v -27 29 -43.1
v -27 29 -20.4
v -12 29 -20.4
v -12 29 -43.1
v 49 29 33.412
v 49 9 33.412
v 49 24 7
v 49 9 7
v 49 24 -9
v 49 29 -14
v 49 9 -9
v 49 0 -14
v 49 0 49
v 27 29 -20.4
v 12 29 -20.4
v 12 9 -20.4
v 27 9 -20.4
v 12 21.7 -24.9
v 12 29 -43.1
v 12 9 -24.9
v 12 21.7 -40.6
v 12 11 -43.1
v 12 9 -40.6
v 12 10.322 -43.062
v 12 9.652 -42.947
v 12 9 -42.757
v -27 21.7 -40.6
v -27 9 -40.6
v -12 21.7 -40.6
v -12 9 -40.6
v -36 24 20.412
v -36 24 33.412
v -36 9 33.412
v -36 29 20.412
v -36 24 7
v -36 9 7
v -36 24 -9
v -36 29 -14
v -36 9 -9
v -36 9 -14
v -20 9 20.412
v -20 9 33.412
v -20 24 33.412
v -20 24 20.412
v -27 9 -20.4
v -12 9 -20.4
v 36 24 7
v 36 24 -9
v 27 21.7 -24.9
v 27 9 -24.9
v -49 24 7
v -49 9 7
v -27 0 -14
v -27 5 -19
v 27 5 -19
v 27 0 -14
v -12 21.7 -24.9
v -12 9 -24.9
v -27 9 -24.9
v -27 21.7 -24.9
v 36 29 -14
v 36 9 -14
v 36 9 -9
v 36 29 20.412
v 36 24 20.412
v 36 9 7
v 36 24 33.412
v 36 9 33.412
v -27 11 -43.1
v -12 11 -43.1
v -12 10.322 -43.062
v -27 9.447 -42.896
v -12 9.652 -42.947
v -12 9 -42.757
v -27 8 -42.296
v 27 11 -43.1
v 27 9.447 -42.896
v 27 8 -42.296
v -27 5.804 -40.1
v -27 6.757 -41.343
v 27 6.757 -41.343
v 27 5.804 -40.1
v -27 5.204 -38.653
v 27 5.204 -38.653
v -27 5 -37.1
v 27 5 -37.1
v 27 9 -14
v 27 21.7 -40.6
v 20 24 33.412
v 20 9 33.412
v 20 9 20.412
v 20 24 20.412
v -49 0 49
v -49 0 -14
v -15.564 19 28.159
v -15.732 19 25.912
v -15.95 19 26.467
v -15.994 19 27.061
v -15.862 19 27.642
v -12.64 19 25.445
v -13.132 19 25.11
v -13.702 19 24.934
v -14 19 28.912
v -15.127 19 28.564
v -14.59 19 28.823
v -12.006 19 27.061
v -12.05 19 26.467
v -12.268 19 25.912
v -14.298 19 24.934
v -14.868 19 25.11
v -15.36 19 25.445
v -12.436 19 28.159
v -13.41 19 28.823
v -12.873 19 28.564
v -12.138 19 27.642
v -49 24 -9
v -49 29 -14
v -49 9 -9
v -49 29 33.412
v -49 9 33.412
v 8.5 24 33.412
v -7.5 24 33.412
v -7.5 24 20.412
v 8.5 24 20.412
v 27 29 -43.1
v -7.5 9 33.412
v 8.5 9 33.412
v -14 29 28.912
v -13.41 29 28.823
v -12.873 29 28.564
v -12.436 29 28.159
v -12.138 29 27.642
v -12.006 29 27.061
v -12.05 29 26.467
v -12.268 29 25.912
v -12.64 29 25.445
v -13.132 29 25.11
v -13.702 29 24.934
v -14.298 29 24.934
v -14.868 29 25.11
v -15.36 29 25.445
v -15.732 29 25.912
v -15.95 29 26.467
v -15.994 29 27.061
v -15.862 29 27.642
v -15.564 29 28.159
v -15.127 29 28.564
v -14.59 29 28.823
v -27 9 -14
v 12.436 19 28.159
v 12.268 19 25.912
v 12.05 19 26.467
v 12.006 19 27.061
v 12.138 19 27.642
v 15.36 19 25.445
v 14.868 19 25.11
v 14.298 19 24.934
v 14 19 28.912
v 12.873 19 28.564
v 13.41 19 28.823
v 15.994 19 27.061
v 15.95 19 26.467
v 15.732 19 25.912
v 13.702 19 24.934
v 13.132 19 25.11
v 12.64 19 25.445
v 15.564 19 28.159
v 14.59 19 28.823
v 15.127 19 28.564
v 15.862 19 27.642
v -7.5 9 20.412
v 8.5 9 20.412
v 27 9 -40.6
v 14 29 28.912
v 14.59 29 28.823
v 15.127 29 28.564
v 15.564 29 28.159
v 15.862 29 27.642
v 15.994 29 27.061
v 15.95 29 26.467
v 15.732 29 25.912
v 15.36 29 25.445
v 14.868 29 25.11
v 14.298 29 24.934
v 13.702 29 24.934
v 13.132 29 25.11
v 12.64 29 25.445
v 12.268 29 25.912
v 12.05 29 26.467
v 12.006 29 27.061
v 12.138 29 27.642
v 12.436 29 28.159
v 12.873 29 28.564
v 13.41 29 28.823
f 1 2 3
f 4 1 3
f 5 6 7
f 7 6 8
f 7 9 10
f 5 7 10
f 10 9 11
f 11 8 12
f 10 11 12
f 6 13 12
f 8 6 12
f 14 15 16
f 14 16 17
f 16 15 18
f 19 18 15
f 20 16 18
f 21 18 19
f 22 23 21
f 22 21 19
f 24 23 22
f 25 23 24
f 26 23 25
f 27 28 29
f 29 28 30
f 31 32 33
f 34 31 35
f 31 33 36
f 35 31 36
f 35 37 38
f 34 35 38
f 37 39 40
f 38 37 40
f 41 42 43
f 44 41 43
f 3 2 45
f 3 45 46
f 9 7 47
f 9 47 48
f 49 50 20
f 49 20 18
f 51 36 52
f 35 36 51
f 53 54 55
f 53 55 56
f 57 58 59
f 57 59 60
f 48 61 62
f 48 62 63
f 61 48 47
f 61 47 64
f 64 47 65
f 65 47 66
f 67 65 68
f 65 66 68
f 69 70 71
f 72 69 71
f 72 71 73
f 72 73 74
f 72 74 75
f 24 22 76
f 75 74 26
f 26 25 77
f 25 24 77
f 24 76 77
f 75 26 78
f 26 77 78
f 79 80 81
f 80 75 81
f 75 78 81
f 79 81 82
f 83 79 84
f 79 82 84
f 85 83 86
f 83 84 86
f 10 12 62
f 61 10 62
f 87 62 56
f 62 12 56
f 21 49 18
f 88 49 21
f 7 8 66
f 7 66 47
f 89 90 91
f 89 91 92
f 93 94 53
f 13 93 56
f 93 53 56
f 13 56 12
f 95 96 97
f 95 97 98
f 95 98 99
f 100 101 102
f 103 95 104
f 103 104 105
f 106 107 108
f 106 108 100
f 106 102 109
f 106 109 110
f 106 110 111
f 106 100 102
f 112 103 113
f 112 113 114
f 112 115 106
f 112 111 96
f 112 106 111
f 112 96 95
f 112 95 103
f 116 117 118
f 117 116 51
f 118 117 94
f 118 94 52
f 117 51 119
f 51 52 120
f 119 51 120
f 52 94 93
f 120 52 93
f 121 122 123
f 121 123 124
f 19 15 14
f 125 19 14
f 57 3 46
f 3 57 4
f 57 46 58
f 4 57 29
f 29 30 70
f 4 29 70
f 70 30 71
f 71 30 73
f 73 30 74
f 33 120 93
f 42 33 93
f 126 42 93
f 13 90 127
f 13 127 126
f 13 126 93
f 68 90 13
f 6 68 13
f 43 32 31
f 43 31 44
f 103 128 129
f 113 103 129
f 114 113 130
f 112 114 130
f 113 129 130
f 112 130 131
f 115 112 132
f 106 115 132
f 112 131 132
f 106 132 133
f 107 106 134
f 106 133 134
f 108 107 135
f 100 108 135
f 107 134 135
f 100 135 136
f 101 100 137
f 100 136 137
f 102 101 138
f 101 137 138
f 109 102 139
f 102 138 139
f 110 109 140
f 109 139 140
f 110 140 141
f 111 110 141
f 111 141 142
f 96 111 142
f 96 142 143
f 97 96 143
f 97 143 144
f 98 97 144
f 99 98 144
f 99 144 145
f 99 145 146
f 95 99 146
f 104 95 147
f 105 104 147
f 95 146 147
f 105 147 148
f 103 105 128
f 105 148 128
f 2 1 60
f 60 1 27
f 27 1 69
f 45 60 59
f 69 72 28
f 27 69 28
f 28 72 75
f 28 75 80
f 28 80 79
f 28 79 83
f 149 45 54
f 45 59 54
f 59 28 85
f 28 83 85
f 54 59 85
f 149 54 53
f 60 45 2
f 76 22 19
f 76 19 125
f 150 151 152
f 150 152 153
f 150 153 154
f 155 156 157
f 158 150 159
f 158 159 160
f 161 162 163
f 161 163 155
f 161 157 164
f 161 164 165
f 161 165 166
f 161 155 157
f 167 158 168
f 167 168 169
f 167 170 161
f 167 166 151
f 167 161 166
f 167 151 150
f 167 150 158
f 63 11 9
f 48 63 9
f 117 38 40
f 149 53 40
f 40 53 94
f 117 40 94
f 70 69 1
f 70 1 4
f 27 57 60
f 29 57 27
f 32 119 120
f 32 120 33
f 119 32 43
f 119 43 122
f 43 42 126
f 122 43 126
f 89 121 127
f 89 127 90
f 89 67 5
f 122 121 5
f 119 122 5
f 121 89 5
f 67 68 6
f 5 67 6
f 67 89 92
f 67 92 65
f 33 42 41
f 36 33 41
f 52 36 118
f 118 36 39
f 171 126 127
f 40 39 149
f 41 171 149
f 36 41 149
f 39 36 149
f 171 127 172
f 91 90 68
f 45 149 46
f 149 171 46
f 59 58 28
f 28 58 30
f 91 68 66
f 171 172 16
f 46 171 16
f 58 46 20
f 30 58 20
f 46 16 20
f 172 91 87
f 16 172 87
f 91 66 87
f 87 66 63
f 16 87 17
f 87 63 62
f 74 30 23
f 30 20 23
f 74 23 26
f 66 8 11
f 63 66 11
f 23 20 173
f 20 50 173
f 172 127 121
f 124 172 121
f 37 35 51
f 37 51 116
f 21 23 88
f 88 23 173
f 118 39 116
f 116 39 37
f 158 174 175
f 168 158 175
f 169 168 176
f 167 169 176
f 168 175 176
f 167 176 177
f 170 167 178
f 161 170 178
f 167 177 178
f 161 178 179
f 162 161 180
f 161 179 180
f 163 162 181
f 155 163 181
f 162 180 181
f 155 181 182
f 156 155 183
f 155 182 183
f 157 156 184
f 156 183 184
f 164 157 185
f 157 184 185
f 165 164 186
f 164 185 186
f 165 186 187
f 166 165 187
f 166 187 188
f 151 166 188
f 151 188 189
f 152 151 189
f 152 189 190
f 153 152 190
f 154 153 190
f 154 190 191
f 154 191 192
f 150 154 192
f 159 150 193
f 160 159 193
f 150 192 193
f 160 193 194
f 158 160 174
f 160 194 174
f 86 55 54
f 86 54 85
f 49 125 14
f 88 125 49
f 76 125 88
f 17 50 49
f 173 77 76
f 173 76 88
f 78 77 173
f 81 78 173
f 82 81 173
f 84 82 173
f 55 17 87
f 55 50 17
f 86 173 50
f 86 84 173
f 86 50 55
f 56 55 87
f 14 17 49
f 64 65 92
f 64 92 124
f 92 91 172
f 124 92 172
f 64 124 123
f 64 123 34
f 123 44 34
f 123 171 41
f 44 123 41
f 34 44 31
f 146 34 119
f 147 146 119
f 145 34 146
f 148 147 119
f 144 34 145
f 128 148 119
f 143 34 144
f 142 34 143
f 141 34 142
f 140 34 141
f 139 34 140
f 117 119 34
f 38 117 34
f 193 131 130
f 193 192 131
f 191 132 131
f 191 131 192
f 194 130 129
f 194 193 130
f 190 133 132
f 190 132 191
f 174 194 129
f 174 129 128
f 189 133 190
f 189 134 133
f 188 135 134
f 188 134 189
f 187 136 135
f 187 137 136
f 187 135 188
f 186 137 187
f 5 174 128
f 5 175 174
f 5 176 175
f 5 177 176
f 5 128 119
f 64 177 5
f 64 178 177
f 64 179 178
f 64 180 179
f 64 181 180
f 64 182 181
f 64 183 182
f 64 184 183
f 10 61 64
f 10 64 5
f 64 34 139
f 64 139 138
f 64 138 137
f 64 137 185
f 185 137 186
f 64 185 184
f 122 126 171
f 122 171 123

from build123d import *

# Parameters (mm, degrees)
CROQUIS1_W              = 98
CROQUIS1_H              = 98
SALIENTE_EXTRUIR1_DEPTH = 9
CHAFL_N1_SIZE2          = 15.588457268
CHAFL_N1_SIZE           = 9
CROQUIS2_W              = 22
CROQUIS2_H              = 35
CORTAR_EXTRUIR1_DEPTH   = 9
CROQUIS3_W              = 15
CROQUIS3_H              = 2.5
SALIENTE_EXTRUIR2_DEPTH = 12.2
CROQUIS4_W              = 15
CROQUIS4_H              = 20.2
SALIENTE_EXTRUIR3_DEPTH = 2.5
CROQUIS5_W              = 5.9
CROQUIS5_H              = 9
CORTAR_EXTRUIR2_DEPTH   = 54.2
CROQUIS6_W              = 15
CROQUIS6_H              = 14.7
SALIENTE_EXTRUIR4_DEPTH = 2.5
SALIENTE_EXTRUIR5_DEPTH = 20
CROQUIS8_W              = 16
CROQUIS8_H              = 15
CORTAR_EXTRUIR3_DEPTH   = 98
CROQUIS9_W              = 16
CROQUIS9_H              = 15
CORTAR_EXTRUIR4_DEPTH   = 13
CROQUIS10_W             = 15
CROQUIS10_H             = 22.7
SALIENTE_EXTRUIR6_DEPTH = 5.3
CROQUIS11_R             = 2
CORTAR_EXTRUIR5_DEPTH   = 10
CROQUIS12_W             = 29.1
CROQUIS12_H             = 5
CORTAR_EXTRUIR6_DEPTH   = 95.963150748
NERVIO1_REACH           = 77.12
CROQUIS13_WALL_W        = 159.310876118
CROQUIS13_WALL_H        = 54
REDONDEO1_R             = 6
CROQUIS14_W             = 15.7
CROQUIS14_H             = 12.7
CORTAR_EXTRUIR7_DEPTH   = 95.963150748


# Some blends are built 0.0001 mm under size
with BuildPart() as part:
    # Croquis1 → Saliente-Extruir1 (new body)
    with BuildSketch(Plane(origin=(0, 0, 0), x_dir=(1, 0, 0), z_dir=(0, 1, 0))):
        Rectangle(CROQUIS1_W, CROQUIS1_H)
    extrude(amount=SALIENTE_EXTRUIR1_DEPTH)

    # Chaflán1
    chafl_n1_edges = [part.edges().sort_by_distance(p)[0] for p in [
        (0, 9, 49),
    ]]
    chafl_n1_side = [part.faces().sort_by_distance(p)[0] for p in [
        (0, 8.82, 49),
    ]]
    chamfer(chafl_n1_edges, length=CHAFL_N1_SIZE - 0.0001, length2=CHAFL_N1_SIZE2 - 0.0001, reference=chafl_n1_side[0])  # a hair under: the kernel refuses the full size

    # Croquis2 → Cortar-Extruir1 (cut)
    with BuildSketch(Plane(origin=(0, 9, 0), x_dir=(1, 0, 0), z_dir=(0, 1, 0))):
        with Locations((-38, 31.5)):
            Rectangle(CROQUIS2_W, CROQUIS2_H)
        with Locations((38, 31.5)):
            Rectangle(CROQUIS2_W, CROQUIS2_H)
    extrude(amount=-CORTAR_EXTRUIR1_DEPTH, mode=Mode.SUBTRACT)

    # Croquis3 → Saliente-Extruir2 (add)
    with BuildSketch(Plane(origin=(0, 9, 0), x_dir=(1, 0, 0), z_dir=(0, 1, 0))):
        with Locations((19.5, 41.85)):
            Rectangle(CROQUIS3_W, CROQUIS3_H)
        with Locations((19.5, 24.15)):
            Rectangle(CROQUIS3_W, CROQUIS3_H)
        with Locations((-19.5, 41.85)):
            Rectangle(CROQUIS3_W, CROQUIS3_H)
        with Locations((-19.5, 24.15)):
            Rectangle(CROQUIS3_W, CROQUIS3_H)
    extrude(amount=SALIENTE_EXTRUIR2_DEPTH)

    # Croquis4 → Saliente-Extruir3 (add)
    with BuildSketch(Plane(origin=(0, 21.2, 0), x_dir=(1, 0, 0), z_dir=(0, 1, 0))):
        with Locations((-19.5, 33)):
            Rectangle(CROQUIS4_W, CROQUIS4_H)
        with Locations((19.5, 33)):
            Rectangle(CROQUIS4_W, CROQUIS4_H)
    extrude(amount=SALIENTE_EXTRUIR3_DEPTH)

    # Croquis5 → Cortar-Extruir2 (cut)
    with BuildSketch(Plane(origin=(27, 0, 0), x_dir=(0, 0, -1), z_dir=(1, 0, 0))):
        with Locations((46.05, 4.5)):
            Rectangle(CROQUIS5_W, CROQUIS5_H)
    extrude(amount=-CORTAR_EXTRUIR2_DEPTH, mode=Mode.SUBTRACT)

    # Croquis6 → Saliente-Extruir4 (add)
    with BuildSketch(Plane.XY.offset(-22.9)):
        with Locations((-19.5, 16.35)):
            Rectangle(CROQUIS6_W, CROQUIS6_H)
        with Locations((19.5, 16.35)):
            Rectangle(CROQUIS6_W, CROQUIS6_H)
    extrude(amount=SALIENTE_EXTRUIR4_DEPTH)

    # Croquis7 → Saliente-Extruir5 (add)
    with BuildSketch(Plane(origin=(0, 9, 0), x_dir=(1, 0, 0), z_dir=(0, 1, 0))):
        Polygon((-49, 14), (-49, -33.411542732), (49, -33.411542732), (49, 14), (36, 14), (36, -20.411542732), (-36, -20.411542732), (-36, 14), align=None)
    extrude(amount=SALIENTE_EXTRUIR5_DEPTH)

    # Croquis8 → Cortar-Extruir3 (cut)
    with BuildSketch(Plane(origin=(49, 0, 0), x_dir=(0, 0, -1), z_dir=(1, 0, 0))):
        with Locations((1, 16.5)):
            Rectangle(CROQUIS8_W, CROQUIS8_H)
    extrude(amount=-CORTAR_EXTRUIR3_DEPTH, mode=Mode.SUBTRACT)

    # Croquis9 → Cortar-Extruir4 (cut)
    with BuildSketch(Plane.XY.offset(33.411542732)):
        with Locations((-28, 16.5)):
            Rectangle(CROQUIS9_W, CROQUIS9_H)
        with Locations((0.5, 16.5)):
            Rectangle(CROQUIS9_W, CROQUIS9_H)
        with Locations((28, 16.5)):
            Rectangle(CROQUIS9_W, CROQUIS9_H)
    extrude(amount=-CORTAR_EXTRUIR4_DEPTH, mode=Mode.SUBTRACT)

    # Croquis10 → Saliente-Extruir6 (add)
    with BuildSketch(Plane(origin=(0, 23.7, 0), x_dir=(1, 0, 0), z_dir=(0, 1, 0))):
        with Locations((-19.5, 31.75)):
            Rectangle(CROQUIS10_W, CROQUIS10_H)
        with Locations((19.5, 31.75)):
            Rectangle(CROQUIS10_W, CROQUIS10_H)
    extrude(amount=SALIENTE_EXTRUIR6_DEPTH)

    # Croquis11 → Cortar-Extruir5 (cut)
    with BuildSketch(Plane(origin=(0, 29, 0), x_dir=(1, 0, 0), z_dir=(0, 1, 0))):
        with Locations(Location((-14, -26.911542732, 0), (0, 0, 270))):
            Circle(CROQUIS11_R)
        with Locations(Location((14, -26.911542732, 0), (0, 0, 270))):
            Circle(CROQUIS11_R)
    extrude(amount=-CORTAR_EXTRUIR5_DEPTH, mode=Mode.SUBTRACT)

    # Croquis12 → Cortar-Extruir6 (cut, through all)
    with BuildSketch(Plane(origin=(27, 0, 0), x_dir=(0, 0, -1), z_dir=(1, 0, 0))):
        with Locations((28.55, 2.5)):
            Rectangle(CROQUIS12_W, CROQUIS12_H)
    extrude(amount=-CORTAR_EXTRUIR6_DEPTH, mode=Mode.SUBTRACT)

    # Croquis13 wall → Nervio1 (add, up to next)
    with BuildSketch(Plane(origin=(0, 2.5, -16.5), x_dir=(0, -0.707106781187, 0.707106781187), z_dir=(0, -0.707106781187, -0.707106781187)), mode=Mode.PRIVATE) as nervio1_sk1:
        Rectangle(CROQUIS13_WALL_W, CROQUIS13_WALL_H)
    nervio1_tool1 = extrude(nervio1_sk1.sketch, amount=-NERVIO1_REACH, mode=Mode.PRIVATE) - part.part
    add(nervio1_tool1.solids().sort_by_distance((0, 2.5, -16.5))[0])

    # Redondeo1
    # the kernel refuses this fillet: 6 mm, written as the material it takes off along each edge
    with BuildSketch(Plane(origin=(42, 5, -43.1), x_dir=(0, 0, 1), z_dir=(-1, 0, 0))) as redondeo1_piece_1:
        with BuildLine():
            CenterArc((REDONDEO1_R, REDONDEO1_R), REDONDEO1_R, 180, 90)
            Line((0, REDONDEO1_R), (0, 0))
            Line((0, 0), (REDONDEO1_R, 0))
        make_face()
    extrude(amount=84, mode=Mode.SUBTRACT)

    # Croquis14 → Cortar-Extruir7 (cut, through all)
    with BuildSketch(Plane(origin=(27, 0, 0), x_dir=(0, 0, -1), z_dir=(1, 0, 0))):
        with Locations((32.75, 15.35)):
            Rectangle(CROQUIS14_W, CROQUIS14_H)
    extrude(amount=-CORTAR_EXTRUIR7_DEPTH, mode=Mode.SUBTRACT)


solid = part.part
